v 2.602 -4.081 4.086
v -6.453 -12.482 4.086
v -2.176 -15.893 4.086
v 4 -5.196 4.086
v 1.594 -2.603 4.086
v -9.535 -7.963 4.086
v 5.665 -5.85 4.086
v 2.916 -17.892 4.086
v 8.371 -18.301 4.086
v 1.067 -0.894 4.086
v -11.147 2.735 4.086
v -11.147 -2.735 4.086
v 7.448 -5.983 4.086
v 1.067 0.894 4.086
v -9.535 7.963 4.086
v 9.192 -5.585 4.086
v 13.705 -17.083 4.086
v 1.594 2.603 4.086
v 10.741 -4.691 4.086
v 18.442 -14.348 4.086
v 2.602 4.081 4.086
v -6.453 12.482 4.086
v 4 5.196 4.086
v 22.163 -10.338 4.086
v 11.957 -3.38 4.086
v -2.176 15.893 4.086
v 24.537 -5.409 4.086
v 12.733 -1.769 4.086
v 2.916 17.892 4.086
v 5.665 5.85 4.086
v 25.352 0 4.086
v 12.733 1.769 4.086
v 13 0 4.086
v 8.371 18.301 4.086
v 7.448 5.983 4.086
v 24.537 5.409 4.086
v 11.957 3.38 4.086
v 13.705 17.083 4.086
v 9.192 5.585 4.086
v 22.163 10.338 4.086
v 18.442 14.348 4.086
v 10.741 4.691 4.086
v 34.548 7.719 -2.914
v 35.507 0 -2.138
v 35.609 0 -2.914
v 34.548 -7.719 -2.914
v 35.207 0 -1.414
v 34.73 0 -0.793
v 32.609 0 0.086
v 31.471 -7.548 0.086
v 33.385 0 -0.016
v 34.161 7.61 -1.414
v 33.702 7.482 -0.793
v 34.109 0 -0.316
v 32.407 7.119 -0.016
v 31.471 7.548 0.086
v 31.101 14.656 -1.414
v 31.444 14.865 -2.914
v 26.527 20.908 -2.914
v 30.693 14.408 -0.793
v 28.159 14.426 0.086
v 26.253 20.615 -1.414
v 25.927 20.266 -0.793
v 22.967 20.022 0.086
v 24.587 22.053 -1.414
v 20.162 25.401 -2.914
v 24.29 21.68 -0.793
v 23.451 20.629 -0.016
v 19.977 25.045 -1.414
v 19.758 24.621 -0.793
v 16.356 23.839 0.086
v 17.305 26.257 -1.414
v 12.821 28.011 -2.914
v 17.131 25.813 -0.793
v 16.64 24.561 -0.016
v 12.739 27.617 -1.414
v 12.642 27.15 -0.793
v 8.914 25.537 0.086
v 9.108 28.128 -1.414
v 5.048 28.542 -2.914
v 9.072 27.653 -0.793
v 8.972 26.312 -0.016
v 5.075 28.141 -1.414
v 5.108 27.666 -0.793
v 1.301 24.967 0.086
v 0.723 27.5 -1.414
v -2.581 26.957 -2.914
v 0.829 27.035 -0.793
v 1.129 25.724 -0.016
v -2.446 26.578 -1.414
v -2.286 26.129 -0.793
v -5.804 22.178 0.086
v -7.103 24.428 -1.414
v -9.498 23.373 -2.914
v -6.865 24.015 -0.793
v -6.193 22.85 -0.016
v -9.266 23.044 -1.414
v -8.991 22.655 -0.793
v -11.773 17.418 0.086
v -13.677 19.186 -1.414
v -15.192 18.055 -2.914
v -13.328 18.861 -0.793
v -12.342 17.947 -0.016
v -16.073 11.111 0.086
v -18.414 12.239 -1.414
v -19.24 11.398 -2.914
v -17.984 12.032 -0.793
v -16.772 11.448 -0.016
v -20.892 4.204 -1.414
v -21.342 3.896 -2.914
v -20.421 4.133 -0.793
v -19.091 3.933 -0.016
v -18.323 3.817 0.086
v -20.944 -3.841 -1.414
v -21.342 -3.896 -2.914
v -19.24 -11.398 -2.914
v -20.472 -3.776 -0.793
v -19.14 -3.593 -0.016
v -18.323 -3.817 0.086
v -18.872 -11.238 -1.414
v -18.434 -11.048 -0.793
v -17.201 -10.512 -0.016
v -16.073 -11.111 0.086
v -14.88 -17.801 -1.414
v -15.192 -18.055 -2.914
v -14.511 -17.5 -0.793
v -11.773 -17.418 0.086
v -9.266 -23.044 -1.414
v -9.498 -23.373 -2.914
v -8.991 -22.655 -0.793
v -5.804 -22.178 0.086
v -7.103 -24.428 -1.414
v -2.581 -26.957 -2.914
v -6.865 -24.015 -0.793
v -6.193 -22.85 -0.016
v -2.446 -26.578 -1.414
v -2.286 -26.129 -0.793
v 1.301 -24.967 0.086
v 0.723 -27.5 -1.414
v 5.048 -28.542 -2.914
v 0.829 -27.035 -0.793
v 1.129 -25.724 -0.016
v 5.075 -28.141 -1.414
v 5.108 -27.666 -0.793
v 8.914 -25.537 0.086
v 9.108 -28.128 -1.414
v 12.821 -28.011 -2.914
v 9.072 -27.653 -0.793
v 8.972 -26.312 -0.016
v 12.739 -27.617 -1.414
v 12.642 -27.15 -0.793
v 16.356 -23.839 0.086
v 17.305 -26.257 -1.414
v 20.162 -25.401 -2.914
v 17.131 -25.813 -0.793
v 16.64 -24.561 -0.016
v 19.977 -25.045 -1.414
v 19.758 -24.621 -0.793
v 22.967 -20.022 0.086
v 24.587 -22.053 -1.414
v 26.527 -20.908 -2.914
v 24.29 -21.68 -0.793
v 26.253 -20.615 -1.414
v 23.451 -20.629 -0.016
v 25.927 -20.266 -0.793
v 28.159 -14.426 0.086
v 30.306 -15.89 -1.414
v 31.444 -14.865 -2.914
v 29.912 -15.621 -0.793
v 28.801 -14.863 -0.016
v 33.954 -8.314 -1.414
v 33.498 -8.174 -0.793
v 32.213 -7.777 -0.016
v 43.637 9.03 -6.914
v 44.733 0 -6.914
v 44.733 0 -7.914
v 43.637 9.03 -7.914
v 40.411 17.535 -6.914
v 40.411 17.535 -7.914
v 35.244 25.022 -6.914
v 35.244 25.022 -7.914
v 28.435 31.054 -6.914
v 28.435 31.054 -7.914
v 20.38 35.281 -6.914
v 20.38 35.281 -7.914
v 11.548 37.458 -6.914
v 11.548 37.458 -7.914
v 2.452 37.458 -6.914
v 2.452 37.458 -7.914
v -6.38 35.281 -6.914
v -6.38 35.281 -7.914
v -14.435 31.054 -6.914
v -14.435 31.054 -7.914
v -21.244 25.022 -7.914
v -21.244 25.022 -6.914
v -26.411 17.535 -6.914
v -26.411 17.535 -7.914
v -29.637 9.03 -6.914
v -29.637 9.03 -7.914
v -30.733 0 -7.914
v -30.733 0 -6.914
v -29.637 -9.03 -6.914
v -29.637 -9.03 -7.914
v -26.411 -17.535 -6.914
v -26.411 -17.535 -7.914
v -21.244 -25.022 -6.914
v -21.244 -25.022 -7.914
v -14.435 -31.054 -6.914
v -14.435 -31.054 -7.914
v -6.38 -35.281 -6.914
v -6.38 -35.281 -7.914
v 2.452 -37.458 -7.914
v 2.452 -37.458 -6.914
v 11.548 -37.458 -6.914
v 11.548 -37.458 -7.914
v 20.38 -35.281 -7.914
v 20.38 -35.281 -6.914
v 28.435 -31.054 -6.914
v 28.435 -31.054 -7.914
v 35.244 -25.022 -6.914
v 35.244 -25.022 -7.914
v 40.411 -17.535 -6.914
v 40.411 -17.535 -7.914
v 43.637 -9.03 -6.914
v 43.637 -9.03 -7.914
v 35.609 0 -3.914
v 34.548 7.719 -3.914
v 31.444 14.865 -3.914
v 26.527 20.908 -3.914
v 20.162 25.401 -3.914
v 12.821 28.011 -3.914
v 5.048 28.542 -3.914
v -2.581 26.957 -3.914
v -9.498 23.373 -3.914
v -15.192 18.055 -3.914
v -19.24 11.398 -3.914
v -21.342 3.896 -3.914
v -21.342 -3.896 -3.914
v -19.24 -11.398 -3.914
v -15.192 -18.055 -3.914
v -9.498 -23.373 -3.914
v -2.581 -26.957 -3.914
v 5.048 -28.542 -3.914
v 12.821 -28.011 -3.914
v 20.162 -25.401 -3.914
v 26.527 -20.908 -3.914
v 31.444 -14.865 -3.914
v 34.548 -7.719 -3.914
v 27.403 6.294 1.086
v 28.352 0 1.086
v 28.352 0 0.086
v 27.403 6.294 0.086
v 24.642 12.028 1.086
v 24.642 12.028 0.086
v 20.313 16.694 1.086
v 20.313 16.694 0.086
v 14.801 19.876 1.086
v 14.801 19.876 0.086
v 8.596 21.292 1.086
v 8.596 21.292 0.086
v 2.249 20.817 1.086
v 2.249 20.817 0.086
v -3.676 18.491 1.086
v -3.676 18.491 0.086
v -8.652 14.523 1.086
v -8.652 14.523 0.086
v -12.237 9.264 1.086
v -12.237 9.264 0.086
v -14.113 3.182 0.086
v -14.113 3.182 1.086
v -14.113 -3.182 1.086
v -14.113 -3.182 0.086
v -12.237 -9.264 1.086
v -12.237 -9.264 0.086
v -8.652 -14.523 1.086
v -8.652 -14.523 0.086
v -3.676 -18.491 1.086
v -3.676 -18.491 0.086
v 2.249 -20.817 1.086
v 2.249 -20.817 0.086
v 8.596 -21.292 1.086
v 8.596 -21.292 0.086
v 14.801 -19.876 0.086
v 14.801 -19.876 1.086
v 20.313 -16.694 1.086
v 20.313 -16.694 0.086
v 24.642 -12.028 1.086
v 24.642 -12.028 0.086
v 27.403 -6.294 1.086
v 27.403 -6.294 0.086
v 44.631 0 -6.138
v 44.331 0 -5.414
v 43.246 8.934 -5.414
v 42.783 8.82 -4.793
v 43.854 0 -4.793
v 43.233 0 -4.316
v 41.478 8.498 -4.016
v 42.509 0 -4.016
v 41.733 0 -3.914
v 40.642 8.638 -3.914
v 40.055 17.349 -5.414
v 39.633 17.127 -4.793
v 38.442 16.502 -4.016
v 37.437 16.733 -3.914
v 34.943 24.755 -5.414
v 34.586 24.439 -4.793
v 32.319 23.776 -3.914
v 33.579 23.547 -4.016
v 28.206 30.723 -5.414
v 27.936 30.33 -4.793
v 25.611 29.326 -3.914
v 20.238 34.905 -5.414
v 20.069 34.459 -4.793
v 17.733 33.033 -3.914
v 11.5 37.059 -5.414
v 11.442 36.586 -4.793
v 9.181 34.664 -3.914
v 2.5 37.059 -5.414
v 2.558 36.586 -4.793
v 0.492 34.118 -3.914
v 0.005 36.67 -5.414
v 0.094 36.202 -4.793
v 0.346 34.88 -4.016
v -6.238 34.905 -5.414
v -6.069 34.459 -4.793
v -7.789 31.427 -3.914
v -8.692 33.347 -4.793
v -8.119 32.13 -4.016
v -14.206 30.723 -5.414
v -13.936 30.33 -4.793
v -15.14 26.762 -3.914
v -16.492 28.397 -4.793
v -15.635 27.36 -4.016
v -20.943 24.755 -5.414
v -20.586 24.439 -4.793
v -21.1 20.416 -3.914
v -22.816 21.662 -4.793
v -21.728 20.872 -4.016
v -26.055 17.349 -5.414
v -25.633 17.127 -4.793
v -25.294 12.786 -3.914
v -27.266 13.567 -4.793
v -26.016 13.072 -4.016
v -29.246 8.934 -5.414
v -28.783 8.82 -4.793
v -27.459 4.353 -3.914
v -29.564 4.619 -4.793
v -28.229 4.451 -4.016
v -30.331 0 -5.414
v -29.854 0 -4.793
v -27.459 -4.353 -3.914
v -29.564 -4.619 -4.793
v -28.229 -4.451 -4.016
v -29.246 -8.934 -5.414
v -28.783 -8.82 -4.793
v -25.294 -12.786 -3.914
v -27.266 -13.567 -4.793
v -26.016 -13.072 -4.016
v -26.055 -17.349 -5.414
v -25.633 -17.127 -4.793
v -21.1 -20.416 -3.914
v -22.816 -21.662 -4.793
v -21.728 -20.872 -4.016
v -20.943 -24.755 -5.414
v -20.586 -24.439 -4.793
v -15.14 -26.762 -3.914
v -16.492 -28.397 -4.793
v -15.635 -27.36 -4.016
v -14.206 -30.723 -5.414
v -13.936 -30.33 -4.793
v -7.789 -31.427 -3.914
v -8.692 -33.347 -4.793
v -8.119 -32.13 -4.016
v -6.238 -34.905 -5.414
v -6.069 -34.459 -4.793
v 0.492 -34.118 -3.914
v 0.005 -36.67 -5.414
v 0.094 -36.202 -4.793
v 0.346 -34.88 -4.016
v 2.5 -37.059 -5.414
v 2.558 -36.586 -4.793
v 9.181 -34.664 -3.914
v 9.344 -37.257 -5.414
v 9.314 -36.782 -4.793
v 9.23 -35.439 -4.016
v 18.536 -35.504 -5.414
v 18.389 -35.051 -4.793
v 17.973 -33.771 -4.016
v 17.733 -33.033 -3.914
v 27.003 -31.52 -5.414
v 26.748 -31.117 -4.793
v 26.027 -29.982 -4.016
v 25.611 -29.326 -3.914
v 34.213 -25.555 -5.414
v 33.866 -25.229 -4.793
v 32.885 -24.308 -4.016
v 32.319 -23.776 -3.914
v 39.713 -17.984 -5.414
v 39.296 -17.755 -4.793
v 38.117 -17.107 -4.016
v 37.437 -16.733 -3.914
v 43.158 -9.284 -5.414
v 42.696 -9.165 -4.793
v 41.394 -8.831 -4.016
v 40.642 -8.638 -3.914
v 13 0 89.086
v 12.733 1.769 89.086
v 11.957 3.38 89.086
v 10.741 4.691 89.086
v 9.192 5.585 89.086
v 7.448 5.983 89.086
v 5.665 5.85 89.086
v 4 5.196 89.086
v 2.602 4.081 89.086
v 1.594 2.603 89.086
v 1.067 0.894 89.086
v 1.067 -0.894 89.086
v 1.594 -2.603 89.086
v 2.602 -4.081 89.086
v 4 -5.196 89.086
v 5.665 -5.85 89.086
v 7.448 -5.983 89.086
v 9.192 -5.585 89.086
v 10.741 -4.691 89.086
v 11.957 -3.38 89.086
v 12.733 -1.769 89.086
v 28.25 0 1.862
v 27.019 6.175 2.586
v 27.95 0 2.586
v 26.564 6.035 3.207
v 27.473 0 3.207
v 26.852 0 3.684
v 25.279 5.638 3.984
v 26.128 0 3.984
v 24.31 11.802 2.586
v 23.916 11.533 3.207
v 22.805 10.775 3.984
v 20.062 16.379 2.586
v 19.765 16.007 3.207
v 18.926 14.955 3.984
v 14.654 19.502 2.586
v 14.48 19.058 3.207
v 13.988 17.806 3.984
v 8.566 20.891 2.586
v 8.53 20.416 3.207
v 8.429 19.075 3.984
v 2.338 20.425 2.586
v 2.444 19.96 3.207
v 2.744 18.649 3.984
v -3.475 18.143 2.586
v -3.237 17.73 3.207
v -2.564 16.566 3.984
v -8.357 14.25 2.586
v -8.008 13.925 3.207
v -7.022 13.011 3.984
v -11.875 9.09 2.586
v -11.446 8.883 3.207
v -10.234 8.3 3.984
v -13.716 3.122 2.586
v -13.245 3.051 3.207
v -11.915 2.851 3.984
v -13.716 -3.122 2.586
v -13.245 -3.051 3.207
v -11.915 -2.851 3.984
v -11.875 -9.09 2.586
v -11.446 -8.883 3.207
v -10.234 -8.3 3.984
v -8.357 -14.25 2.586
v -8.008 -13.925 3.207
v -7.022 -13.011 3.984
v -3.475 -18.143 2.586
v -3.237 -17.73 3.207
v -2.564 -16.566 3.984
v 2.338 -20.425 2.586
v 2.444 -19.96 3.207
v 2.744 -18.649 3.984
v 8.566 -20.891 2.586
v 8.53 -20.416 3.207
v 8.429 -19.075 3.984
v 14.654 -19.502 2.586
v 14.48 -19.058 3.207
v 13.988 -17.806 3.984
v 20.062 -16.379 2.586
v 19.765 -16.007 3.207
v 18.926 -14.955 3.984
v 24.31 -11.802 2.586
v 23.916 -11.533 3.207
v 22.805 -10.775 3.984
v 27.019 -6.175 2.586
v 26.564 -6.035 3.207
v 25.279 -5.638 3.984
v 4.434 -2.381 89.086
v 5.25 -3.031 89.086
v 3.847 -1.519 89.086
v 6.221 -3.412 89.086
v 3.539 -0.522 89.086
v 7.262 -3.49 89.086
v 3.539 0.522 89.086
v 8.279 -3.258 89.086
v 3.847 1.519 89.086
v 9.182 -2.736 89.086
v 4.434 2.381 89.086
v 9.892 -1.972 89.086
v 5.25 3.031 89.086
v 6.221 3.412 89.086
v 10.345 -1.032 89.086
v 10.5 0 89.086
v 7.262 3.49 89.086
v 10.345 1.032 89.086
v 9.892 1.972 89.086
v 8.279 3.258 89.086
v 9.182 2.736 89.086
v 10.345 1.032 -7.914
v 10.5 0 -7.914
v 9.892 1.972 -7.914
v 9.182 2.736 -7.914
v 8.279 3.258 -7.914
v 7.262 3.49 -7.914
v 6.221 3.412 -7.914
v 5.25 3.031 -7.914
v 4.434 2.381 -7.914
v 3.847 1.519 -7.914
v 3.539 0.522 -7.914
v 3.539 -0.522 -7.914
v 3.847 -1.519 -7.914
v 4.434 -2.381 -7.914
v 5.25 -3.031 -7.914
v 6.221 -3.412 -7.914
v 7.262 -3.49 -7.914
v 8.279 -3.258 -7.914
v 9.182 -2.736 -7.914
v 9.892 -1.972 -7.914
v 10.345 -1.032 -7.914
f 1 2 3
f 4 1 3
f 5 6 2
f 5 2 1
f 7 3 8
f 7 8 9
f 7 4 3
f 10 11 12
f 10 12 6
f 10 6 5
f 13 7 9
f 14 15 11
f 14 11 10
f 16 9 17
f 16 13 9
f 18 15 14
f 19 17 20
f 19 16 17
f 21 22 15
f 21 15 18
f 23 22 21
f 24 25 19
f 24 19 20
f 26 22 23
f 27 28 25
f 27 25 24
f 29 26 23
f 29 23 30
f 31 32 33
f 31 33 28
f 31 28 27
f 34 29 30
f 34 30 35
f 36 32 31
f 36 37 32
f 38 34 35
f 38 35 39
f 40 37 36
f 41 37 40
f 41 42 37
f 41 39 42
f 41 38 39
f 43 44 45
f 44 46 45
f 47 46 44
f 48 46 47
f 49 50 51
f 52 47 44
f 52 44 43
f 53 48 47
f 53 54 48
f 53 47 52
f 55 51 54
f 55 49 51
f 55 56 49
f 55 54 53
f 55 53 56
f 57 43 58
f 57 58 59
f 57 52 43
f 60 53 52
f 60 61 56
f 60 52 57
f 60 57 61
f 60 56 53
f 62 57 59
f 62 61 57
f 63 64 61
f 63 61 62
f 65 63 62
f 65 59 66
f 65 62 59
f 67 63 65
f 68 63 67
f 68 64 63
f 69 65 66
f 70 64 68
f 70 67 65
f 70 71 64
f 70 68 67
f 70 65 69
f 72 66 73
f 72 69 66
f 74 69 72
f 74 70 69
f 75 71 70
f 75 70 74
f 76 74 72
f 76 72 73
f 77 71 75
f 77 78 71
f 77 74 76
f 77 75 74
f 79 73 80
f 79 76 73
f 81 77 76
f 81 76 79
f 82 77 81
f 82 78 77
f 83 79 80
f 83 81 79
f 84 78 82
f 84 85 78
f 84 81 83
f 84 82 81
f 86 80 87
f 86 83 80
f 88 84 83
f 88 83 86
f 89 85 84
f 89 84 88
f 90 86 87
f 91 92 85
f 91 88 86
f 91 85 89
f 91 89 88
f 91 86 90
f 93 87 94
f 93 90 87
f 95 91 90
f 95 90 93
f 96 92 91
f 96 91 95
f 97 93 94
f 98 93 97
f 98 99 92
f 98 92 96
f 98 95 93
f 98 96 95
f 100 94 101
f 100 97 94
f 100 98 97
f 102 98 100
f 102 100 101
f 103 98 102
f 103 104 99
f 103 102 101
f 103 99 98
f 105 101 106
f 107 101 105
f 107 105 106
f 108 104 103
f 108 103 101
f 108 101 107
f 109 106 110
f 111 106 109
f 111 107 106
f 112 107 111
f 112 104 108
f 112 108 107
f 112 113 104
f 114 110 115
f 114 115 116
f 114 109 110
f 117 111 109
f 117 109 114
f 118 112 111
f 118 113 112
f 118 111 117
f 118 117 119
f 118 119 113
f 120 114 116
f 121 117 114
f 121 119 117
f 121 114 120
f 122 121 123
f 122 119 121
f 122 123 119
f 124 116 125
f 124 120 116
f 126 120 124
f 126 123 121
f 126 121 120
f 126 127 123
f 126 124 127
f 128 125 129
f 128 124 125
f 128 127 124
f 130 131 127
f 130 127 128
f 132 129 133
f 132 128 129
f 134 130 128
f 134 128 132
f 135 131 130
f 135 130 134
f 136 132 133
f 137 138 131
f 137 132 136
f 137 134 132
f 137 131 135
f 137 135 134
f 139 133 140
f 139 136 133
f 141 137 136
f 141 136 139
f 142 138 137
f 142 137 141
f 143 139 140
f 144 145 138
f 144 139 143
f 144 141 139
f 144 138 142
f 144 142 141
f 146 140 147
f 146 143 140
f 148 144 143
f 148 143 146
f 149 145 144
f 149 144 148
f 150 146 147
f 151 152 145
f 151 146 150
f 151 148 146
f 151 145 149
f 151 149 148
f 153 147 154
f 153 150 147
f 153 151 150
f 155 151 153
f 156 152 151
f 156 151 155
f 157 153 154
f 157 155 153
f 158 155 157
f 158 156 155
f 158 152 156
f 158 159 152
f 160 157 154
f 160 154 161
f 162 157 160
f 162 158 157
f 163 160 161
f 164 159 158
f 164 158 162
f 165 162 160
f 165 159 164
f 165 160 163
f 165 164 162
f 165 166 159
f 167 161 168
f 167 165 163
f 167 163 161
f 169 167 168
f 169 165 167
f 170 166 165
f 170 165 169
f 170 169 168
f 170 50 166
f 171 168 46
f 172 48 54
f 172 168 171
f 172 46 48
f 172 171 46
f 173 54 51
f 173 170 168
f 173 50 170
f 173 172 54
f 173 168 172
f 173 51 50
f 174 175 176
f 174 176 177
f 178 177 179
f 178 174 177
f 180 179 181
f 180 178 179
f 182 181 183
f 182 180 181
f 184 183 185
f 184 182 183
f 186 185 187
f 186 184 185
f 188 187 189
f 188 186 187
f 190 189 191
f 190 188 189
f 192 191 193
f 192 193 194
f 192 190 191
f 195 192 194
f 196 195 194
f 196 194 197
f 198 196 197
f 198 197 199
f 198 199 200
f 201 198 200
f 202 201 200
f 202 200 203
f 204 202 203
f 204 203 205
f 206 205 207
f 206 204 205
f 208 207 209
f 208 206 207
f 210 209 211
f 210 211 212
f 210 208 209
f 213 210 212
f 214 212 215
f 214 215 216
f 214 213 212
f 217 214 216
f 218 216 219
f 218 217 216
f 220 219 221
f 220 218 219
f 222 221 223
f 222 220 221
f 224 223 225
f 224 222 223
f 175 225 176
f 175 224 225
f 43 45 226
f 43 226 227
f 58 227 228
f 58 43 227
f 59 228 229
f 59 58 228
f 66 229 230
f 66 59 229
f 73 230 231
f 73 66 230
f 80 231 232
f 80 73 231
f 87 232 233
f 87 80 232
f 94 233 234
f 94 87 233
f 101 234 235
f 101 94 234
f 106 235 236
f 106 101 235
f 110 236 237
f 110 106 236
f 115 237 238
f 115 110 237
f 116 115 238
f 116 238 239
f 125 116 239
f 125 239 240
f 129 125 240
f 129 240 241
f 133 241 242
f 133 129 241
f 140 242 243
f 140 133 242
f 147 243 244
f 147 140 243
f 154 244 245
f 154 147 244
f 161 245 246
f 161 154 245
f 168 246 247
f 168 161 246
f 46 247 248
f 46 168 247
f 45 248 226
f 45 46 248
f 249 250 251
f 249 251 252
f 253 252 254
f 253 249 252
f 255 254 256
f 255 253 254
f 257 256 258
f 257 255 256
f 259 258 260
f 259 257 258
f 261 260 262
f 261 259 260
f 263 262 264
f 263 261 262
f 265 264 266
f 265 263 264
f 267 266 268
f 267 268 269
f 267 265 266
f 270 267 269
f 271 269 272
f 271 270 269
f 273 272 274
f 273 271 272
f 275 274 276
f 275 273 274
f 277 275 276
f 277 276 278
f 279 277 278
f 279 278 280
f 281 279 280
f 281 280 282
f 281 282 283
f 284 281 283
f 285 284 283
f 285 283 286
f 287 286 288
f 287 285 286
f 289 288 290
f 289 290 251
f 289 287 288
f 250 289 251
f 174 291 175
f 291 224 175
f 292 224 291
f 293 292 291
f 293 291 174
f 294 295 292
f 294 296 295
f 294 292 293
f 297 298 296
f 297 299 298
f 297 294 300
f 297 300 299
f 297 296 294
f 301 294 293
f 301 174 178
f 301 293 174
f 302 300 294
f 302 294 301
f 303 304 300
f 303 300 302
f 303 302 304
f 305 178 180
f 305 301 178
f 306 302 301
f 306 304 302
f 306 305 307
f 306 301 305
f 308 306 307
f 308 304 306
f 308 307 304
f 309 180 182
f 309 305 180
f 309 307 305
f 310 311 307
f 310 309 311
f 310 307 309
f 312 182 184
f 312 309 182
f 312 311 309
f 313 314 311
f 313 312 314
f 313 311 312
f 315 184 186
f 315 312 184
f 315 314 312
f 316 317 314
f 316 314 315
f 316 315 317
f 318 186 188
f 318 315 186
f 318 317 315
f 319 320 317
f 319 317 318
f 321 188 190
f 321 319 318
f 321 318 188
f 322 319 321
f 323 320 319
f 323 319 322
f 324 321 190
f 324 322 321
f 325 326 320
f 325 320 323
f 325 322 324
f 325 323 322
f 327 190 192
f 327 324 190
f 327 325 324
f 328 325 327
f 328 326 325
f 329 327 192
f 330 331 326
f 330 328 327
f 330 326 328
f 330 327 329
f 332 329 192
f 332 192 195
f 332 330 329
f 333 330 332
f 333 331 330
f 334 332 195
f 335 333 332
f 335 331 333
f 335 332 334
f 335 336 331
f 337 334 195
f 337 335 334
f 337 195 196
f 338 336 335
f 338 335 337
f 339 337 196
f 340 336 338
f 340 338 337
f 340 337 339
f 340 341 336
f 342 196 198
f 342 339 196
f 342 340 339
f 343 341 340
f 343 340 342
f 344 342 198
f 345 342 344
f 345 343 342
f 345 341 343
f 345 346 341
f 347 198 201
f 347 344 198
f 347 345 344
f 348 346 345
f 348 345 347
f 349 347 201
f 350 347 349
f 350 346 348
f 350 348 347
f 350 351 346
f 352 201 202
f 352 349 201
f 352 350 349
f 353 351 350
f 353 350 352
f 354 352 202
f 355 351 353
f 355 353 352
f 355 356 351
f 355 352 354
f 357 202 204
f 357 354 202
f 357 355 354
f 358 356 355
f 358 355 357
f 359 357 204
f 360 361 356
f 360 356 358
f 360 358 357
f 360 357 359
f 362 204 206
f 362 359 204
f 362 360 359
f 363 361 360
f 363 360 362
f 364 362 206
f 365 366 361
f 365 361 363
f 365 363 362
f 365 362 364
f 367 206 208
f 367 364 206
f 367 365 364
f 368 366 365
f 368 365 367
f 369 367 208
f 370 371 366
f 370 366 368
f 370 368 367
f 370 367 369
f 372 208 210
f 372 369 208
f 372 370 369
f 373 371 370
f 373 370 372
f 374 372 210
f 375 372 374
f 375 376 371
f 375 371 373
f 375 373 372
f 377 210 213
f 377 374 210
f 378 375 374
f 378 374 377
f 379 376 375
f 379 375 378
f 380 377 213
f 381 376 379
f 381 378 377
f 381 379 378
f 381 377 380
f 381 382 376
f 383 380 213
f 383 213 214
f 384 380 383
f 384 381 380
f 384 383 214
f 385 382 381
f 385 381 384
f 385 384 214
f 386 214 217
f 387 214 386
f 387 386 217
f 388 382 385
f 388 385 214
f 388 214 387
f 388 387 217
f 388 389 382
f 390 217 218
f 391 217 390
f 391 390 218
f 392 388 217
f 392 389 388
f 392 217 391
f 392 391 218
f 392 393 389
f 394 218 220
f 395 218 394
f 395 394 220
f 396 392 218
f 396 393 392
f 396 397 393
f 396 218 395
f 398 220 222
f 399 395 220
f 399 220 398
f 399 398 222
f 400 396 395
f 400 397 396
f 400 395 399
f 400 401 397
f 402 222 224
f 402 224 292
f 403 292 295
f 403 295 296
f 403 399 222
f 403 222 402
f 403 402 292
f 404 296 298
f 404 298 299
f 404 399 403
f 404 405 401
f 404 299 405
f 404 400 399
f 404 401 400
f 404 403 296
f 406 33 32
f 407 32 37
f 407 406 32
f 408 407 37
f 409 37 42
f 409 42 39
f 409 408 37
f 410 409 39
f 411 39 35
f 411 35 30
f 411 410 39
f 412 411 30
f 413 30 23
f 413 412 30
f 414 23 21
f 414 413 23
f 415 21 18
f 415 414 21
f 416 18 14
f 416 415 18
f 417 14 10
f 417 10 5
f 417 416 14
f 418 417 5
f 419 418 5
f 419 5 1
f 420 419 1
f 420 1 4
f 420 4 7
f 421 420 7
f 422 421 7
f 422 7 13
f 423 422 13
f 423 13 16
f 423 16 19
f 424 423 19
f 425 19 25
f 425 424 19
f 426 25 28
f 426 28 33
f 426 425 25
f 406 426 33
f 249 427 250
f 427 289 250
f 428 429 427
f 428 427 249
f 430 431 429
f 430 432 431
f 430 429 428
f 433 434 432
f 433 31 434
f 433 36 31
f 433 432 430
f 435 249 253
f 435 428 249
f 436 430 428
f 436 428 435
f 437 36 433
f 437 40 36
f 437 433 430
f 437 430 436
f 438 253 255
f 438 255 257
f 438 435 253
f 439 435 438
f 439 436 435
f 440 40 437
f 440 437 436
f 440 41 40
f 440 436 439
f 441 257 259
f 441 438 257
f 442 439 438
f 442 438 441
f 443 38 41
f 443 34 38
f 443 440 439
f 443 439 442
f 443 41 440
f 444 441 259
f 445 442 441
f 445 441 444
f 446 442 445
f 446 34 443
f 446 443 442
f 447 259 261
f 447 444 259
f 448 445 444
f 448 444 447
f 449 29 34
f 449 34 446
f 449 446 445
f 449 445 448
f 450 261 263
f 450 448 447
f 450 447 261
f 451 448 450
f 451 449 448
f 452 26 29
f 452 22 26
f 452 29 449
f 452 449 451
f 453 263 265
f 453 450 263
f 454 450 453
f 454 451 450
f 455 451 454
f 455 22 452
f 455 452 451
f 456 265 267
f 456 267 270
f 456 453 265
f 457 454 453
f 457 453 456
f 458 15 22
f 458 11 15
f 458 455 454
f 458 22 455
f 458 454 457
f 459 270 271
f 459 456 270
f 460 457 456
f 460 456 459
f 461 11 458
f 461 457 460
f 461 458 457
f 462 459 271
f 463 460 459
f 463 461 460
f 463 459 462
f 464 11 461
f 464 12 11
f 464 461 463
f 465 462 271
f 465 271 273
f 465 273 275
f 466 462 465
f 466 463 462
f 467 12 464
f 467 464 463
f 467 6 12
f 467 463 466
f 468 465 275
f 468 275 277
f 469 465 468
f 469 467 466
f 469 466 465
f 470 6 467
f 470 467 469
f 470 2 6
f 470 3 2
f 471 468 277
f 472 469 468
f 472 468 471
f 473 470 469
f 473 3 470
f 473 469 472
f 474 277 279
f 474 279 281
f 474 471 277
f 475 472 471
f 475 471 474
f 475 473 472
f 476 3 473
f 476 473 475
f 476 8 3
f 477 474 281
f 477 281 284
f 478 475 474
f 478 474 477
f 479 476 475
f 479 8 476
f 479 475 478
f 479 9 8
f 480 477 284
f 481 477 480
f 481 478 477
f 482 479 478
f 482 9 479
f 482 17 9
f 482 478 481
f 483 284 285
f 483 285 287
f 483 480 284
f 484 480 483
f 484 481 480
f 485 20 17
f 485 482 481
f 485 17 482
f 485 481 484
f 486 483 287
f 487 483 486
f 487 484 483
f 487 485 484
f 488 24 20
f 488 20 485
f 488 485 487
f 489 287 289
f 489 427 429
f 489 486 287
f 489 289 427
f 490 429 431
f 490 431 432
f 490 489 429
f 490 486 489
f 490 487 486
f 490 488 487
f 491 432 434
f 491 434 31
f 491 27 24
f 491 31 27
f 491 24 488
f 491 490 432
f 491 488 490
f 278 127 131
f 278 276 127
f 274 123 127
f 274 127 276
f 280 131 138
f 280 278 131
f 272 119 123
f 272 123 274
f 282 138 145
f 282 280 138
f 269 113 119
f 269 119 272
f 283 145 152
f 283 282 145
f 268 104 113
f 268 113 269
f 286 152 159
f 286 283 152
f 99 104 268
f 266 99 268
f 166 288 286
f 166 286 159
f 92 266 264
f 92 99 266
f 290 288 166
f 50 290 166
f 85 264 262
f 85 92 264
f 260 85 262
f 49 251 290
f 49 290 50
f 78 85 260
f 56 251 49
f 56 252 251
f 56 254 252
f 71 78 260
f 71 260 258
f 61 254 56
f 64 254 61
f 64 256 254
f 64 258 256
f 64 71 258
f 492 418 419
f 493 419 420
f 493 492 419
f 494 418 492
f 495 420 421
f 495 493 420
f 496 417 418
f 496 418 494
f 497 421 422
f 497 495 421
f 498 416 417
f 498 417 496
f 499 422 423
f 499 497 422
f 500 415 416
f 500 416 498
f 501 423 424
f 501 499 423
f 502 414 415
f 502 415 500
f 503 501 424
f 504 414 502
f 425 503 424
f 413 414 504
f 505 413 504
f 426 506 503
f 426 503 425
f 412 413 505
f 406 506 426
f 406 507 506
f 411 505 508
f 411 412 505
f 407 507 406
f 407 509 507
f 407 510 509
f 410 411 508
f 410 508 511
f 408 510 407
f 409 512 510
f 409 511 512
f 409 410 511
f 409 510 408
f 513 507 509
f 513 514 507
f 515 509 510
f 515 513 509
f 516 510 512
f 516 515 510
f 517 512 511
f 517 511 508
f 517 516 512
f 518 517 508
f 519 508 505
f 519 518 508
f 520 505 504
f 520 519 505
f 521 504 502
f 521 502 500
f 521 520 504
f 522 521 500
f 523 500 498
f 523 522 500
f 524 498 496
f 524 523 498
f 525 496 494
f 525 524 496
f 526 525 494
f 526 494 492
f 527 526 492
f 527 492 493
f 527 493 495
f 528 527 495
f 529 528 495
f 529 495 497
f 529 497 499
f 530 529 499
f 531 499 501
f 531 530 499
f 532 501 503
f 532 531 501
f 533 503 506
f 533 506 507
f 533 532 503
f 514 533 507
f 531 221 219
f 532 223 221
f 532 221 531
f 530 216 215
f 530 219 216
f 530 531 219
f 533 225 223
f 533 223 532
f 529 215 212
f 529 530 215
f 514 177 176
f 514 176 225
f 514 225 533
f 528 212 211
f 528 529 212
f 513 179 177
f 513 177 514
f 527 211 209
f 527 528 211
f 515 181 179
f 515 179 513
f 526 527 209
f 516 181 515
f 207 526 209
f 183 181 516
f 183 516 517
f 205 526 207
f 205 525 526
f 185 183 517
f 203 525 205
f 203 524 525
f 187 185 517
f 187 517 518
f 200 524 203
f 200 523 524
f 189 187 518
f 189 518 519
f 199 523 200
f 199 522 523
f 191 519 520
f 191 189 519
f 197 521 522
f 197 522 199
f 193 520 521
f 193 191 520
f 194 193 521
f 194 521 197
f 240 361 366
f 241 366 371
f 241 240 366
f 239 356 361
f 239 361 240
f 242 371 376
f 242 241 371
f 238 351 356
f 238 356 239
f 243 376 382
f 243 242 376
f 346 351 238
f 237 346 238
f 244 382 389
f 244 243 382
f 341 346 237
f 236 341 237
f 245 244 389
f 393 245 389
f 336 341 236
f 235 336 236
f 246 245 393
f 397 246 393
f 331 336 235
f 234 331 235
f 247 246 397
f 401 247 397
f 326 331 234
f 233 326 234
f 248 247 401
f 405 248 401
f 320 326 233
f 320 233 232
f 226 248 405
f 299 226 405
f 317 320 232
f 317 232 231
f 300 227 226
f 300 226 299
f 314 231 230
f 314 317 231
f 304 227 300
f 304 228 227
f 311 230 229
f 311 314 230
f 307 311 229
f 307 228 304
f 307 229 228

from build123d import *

# Parameters (mm, degrees)
FILLET_R = 3


with BuildPart() as part:
    # Sketch → Revolution (revolve)
    with BuildSketch(Plane(origin=(7, 0, 0), x_dir=(1, 0, 0), z_dir=(0, -1, 0))):
        Polygon((37.732979, -7.91416), (37.732979, -3.91416), (28.608906, -3.91416), (28.608906, 0.08584), (21.351952, 0.08584), (21.351952, 4.08584), (6, 4.08584), (6, 89.08584), (3.5, 89.08584), (3.5, -7.91416), align=None)
    revolve(axis=Axis((7, 0, 0), (0, 0, 1)))

    # Fillet
    fillet_edges = [part.edges().sort_by_distance(p)[0] for p in [
        (-14.351952, 0, 4.08584),
        (-21.608906, 0, 0.08584),
        (-30.732979, 0, -3.91416),
    ]]
    fillet(fillet_edges, radius=FILLET_R)


solid = part.part
